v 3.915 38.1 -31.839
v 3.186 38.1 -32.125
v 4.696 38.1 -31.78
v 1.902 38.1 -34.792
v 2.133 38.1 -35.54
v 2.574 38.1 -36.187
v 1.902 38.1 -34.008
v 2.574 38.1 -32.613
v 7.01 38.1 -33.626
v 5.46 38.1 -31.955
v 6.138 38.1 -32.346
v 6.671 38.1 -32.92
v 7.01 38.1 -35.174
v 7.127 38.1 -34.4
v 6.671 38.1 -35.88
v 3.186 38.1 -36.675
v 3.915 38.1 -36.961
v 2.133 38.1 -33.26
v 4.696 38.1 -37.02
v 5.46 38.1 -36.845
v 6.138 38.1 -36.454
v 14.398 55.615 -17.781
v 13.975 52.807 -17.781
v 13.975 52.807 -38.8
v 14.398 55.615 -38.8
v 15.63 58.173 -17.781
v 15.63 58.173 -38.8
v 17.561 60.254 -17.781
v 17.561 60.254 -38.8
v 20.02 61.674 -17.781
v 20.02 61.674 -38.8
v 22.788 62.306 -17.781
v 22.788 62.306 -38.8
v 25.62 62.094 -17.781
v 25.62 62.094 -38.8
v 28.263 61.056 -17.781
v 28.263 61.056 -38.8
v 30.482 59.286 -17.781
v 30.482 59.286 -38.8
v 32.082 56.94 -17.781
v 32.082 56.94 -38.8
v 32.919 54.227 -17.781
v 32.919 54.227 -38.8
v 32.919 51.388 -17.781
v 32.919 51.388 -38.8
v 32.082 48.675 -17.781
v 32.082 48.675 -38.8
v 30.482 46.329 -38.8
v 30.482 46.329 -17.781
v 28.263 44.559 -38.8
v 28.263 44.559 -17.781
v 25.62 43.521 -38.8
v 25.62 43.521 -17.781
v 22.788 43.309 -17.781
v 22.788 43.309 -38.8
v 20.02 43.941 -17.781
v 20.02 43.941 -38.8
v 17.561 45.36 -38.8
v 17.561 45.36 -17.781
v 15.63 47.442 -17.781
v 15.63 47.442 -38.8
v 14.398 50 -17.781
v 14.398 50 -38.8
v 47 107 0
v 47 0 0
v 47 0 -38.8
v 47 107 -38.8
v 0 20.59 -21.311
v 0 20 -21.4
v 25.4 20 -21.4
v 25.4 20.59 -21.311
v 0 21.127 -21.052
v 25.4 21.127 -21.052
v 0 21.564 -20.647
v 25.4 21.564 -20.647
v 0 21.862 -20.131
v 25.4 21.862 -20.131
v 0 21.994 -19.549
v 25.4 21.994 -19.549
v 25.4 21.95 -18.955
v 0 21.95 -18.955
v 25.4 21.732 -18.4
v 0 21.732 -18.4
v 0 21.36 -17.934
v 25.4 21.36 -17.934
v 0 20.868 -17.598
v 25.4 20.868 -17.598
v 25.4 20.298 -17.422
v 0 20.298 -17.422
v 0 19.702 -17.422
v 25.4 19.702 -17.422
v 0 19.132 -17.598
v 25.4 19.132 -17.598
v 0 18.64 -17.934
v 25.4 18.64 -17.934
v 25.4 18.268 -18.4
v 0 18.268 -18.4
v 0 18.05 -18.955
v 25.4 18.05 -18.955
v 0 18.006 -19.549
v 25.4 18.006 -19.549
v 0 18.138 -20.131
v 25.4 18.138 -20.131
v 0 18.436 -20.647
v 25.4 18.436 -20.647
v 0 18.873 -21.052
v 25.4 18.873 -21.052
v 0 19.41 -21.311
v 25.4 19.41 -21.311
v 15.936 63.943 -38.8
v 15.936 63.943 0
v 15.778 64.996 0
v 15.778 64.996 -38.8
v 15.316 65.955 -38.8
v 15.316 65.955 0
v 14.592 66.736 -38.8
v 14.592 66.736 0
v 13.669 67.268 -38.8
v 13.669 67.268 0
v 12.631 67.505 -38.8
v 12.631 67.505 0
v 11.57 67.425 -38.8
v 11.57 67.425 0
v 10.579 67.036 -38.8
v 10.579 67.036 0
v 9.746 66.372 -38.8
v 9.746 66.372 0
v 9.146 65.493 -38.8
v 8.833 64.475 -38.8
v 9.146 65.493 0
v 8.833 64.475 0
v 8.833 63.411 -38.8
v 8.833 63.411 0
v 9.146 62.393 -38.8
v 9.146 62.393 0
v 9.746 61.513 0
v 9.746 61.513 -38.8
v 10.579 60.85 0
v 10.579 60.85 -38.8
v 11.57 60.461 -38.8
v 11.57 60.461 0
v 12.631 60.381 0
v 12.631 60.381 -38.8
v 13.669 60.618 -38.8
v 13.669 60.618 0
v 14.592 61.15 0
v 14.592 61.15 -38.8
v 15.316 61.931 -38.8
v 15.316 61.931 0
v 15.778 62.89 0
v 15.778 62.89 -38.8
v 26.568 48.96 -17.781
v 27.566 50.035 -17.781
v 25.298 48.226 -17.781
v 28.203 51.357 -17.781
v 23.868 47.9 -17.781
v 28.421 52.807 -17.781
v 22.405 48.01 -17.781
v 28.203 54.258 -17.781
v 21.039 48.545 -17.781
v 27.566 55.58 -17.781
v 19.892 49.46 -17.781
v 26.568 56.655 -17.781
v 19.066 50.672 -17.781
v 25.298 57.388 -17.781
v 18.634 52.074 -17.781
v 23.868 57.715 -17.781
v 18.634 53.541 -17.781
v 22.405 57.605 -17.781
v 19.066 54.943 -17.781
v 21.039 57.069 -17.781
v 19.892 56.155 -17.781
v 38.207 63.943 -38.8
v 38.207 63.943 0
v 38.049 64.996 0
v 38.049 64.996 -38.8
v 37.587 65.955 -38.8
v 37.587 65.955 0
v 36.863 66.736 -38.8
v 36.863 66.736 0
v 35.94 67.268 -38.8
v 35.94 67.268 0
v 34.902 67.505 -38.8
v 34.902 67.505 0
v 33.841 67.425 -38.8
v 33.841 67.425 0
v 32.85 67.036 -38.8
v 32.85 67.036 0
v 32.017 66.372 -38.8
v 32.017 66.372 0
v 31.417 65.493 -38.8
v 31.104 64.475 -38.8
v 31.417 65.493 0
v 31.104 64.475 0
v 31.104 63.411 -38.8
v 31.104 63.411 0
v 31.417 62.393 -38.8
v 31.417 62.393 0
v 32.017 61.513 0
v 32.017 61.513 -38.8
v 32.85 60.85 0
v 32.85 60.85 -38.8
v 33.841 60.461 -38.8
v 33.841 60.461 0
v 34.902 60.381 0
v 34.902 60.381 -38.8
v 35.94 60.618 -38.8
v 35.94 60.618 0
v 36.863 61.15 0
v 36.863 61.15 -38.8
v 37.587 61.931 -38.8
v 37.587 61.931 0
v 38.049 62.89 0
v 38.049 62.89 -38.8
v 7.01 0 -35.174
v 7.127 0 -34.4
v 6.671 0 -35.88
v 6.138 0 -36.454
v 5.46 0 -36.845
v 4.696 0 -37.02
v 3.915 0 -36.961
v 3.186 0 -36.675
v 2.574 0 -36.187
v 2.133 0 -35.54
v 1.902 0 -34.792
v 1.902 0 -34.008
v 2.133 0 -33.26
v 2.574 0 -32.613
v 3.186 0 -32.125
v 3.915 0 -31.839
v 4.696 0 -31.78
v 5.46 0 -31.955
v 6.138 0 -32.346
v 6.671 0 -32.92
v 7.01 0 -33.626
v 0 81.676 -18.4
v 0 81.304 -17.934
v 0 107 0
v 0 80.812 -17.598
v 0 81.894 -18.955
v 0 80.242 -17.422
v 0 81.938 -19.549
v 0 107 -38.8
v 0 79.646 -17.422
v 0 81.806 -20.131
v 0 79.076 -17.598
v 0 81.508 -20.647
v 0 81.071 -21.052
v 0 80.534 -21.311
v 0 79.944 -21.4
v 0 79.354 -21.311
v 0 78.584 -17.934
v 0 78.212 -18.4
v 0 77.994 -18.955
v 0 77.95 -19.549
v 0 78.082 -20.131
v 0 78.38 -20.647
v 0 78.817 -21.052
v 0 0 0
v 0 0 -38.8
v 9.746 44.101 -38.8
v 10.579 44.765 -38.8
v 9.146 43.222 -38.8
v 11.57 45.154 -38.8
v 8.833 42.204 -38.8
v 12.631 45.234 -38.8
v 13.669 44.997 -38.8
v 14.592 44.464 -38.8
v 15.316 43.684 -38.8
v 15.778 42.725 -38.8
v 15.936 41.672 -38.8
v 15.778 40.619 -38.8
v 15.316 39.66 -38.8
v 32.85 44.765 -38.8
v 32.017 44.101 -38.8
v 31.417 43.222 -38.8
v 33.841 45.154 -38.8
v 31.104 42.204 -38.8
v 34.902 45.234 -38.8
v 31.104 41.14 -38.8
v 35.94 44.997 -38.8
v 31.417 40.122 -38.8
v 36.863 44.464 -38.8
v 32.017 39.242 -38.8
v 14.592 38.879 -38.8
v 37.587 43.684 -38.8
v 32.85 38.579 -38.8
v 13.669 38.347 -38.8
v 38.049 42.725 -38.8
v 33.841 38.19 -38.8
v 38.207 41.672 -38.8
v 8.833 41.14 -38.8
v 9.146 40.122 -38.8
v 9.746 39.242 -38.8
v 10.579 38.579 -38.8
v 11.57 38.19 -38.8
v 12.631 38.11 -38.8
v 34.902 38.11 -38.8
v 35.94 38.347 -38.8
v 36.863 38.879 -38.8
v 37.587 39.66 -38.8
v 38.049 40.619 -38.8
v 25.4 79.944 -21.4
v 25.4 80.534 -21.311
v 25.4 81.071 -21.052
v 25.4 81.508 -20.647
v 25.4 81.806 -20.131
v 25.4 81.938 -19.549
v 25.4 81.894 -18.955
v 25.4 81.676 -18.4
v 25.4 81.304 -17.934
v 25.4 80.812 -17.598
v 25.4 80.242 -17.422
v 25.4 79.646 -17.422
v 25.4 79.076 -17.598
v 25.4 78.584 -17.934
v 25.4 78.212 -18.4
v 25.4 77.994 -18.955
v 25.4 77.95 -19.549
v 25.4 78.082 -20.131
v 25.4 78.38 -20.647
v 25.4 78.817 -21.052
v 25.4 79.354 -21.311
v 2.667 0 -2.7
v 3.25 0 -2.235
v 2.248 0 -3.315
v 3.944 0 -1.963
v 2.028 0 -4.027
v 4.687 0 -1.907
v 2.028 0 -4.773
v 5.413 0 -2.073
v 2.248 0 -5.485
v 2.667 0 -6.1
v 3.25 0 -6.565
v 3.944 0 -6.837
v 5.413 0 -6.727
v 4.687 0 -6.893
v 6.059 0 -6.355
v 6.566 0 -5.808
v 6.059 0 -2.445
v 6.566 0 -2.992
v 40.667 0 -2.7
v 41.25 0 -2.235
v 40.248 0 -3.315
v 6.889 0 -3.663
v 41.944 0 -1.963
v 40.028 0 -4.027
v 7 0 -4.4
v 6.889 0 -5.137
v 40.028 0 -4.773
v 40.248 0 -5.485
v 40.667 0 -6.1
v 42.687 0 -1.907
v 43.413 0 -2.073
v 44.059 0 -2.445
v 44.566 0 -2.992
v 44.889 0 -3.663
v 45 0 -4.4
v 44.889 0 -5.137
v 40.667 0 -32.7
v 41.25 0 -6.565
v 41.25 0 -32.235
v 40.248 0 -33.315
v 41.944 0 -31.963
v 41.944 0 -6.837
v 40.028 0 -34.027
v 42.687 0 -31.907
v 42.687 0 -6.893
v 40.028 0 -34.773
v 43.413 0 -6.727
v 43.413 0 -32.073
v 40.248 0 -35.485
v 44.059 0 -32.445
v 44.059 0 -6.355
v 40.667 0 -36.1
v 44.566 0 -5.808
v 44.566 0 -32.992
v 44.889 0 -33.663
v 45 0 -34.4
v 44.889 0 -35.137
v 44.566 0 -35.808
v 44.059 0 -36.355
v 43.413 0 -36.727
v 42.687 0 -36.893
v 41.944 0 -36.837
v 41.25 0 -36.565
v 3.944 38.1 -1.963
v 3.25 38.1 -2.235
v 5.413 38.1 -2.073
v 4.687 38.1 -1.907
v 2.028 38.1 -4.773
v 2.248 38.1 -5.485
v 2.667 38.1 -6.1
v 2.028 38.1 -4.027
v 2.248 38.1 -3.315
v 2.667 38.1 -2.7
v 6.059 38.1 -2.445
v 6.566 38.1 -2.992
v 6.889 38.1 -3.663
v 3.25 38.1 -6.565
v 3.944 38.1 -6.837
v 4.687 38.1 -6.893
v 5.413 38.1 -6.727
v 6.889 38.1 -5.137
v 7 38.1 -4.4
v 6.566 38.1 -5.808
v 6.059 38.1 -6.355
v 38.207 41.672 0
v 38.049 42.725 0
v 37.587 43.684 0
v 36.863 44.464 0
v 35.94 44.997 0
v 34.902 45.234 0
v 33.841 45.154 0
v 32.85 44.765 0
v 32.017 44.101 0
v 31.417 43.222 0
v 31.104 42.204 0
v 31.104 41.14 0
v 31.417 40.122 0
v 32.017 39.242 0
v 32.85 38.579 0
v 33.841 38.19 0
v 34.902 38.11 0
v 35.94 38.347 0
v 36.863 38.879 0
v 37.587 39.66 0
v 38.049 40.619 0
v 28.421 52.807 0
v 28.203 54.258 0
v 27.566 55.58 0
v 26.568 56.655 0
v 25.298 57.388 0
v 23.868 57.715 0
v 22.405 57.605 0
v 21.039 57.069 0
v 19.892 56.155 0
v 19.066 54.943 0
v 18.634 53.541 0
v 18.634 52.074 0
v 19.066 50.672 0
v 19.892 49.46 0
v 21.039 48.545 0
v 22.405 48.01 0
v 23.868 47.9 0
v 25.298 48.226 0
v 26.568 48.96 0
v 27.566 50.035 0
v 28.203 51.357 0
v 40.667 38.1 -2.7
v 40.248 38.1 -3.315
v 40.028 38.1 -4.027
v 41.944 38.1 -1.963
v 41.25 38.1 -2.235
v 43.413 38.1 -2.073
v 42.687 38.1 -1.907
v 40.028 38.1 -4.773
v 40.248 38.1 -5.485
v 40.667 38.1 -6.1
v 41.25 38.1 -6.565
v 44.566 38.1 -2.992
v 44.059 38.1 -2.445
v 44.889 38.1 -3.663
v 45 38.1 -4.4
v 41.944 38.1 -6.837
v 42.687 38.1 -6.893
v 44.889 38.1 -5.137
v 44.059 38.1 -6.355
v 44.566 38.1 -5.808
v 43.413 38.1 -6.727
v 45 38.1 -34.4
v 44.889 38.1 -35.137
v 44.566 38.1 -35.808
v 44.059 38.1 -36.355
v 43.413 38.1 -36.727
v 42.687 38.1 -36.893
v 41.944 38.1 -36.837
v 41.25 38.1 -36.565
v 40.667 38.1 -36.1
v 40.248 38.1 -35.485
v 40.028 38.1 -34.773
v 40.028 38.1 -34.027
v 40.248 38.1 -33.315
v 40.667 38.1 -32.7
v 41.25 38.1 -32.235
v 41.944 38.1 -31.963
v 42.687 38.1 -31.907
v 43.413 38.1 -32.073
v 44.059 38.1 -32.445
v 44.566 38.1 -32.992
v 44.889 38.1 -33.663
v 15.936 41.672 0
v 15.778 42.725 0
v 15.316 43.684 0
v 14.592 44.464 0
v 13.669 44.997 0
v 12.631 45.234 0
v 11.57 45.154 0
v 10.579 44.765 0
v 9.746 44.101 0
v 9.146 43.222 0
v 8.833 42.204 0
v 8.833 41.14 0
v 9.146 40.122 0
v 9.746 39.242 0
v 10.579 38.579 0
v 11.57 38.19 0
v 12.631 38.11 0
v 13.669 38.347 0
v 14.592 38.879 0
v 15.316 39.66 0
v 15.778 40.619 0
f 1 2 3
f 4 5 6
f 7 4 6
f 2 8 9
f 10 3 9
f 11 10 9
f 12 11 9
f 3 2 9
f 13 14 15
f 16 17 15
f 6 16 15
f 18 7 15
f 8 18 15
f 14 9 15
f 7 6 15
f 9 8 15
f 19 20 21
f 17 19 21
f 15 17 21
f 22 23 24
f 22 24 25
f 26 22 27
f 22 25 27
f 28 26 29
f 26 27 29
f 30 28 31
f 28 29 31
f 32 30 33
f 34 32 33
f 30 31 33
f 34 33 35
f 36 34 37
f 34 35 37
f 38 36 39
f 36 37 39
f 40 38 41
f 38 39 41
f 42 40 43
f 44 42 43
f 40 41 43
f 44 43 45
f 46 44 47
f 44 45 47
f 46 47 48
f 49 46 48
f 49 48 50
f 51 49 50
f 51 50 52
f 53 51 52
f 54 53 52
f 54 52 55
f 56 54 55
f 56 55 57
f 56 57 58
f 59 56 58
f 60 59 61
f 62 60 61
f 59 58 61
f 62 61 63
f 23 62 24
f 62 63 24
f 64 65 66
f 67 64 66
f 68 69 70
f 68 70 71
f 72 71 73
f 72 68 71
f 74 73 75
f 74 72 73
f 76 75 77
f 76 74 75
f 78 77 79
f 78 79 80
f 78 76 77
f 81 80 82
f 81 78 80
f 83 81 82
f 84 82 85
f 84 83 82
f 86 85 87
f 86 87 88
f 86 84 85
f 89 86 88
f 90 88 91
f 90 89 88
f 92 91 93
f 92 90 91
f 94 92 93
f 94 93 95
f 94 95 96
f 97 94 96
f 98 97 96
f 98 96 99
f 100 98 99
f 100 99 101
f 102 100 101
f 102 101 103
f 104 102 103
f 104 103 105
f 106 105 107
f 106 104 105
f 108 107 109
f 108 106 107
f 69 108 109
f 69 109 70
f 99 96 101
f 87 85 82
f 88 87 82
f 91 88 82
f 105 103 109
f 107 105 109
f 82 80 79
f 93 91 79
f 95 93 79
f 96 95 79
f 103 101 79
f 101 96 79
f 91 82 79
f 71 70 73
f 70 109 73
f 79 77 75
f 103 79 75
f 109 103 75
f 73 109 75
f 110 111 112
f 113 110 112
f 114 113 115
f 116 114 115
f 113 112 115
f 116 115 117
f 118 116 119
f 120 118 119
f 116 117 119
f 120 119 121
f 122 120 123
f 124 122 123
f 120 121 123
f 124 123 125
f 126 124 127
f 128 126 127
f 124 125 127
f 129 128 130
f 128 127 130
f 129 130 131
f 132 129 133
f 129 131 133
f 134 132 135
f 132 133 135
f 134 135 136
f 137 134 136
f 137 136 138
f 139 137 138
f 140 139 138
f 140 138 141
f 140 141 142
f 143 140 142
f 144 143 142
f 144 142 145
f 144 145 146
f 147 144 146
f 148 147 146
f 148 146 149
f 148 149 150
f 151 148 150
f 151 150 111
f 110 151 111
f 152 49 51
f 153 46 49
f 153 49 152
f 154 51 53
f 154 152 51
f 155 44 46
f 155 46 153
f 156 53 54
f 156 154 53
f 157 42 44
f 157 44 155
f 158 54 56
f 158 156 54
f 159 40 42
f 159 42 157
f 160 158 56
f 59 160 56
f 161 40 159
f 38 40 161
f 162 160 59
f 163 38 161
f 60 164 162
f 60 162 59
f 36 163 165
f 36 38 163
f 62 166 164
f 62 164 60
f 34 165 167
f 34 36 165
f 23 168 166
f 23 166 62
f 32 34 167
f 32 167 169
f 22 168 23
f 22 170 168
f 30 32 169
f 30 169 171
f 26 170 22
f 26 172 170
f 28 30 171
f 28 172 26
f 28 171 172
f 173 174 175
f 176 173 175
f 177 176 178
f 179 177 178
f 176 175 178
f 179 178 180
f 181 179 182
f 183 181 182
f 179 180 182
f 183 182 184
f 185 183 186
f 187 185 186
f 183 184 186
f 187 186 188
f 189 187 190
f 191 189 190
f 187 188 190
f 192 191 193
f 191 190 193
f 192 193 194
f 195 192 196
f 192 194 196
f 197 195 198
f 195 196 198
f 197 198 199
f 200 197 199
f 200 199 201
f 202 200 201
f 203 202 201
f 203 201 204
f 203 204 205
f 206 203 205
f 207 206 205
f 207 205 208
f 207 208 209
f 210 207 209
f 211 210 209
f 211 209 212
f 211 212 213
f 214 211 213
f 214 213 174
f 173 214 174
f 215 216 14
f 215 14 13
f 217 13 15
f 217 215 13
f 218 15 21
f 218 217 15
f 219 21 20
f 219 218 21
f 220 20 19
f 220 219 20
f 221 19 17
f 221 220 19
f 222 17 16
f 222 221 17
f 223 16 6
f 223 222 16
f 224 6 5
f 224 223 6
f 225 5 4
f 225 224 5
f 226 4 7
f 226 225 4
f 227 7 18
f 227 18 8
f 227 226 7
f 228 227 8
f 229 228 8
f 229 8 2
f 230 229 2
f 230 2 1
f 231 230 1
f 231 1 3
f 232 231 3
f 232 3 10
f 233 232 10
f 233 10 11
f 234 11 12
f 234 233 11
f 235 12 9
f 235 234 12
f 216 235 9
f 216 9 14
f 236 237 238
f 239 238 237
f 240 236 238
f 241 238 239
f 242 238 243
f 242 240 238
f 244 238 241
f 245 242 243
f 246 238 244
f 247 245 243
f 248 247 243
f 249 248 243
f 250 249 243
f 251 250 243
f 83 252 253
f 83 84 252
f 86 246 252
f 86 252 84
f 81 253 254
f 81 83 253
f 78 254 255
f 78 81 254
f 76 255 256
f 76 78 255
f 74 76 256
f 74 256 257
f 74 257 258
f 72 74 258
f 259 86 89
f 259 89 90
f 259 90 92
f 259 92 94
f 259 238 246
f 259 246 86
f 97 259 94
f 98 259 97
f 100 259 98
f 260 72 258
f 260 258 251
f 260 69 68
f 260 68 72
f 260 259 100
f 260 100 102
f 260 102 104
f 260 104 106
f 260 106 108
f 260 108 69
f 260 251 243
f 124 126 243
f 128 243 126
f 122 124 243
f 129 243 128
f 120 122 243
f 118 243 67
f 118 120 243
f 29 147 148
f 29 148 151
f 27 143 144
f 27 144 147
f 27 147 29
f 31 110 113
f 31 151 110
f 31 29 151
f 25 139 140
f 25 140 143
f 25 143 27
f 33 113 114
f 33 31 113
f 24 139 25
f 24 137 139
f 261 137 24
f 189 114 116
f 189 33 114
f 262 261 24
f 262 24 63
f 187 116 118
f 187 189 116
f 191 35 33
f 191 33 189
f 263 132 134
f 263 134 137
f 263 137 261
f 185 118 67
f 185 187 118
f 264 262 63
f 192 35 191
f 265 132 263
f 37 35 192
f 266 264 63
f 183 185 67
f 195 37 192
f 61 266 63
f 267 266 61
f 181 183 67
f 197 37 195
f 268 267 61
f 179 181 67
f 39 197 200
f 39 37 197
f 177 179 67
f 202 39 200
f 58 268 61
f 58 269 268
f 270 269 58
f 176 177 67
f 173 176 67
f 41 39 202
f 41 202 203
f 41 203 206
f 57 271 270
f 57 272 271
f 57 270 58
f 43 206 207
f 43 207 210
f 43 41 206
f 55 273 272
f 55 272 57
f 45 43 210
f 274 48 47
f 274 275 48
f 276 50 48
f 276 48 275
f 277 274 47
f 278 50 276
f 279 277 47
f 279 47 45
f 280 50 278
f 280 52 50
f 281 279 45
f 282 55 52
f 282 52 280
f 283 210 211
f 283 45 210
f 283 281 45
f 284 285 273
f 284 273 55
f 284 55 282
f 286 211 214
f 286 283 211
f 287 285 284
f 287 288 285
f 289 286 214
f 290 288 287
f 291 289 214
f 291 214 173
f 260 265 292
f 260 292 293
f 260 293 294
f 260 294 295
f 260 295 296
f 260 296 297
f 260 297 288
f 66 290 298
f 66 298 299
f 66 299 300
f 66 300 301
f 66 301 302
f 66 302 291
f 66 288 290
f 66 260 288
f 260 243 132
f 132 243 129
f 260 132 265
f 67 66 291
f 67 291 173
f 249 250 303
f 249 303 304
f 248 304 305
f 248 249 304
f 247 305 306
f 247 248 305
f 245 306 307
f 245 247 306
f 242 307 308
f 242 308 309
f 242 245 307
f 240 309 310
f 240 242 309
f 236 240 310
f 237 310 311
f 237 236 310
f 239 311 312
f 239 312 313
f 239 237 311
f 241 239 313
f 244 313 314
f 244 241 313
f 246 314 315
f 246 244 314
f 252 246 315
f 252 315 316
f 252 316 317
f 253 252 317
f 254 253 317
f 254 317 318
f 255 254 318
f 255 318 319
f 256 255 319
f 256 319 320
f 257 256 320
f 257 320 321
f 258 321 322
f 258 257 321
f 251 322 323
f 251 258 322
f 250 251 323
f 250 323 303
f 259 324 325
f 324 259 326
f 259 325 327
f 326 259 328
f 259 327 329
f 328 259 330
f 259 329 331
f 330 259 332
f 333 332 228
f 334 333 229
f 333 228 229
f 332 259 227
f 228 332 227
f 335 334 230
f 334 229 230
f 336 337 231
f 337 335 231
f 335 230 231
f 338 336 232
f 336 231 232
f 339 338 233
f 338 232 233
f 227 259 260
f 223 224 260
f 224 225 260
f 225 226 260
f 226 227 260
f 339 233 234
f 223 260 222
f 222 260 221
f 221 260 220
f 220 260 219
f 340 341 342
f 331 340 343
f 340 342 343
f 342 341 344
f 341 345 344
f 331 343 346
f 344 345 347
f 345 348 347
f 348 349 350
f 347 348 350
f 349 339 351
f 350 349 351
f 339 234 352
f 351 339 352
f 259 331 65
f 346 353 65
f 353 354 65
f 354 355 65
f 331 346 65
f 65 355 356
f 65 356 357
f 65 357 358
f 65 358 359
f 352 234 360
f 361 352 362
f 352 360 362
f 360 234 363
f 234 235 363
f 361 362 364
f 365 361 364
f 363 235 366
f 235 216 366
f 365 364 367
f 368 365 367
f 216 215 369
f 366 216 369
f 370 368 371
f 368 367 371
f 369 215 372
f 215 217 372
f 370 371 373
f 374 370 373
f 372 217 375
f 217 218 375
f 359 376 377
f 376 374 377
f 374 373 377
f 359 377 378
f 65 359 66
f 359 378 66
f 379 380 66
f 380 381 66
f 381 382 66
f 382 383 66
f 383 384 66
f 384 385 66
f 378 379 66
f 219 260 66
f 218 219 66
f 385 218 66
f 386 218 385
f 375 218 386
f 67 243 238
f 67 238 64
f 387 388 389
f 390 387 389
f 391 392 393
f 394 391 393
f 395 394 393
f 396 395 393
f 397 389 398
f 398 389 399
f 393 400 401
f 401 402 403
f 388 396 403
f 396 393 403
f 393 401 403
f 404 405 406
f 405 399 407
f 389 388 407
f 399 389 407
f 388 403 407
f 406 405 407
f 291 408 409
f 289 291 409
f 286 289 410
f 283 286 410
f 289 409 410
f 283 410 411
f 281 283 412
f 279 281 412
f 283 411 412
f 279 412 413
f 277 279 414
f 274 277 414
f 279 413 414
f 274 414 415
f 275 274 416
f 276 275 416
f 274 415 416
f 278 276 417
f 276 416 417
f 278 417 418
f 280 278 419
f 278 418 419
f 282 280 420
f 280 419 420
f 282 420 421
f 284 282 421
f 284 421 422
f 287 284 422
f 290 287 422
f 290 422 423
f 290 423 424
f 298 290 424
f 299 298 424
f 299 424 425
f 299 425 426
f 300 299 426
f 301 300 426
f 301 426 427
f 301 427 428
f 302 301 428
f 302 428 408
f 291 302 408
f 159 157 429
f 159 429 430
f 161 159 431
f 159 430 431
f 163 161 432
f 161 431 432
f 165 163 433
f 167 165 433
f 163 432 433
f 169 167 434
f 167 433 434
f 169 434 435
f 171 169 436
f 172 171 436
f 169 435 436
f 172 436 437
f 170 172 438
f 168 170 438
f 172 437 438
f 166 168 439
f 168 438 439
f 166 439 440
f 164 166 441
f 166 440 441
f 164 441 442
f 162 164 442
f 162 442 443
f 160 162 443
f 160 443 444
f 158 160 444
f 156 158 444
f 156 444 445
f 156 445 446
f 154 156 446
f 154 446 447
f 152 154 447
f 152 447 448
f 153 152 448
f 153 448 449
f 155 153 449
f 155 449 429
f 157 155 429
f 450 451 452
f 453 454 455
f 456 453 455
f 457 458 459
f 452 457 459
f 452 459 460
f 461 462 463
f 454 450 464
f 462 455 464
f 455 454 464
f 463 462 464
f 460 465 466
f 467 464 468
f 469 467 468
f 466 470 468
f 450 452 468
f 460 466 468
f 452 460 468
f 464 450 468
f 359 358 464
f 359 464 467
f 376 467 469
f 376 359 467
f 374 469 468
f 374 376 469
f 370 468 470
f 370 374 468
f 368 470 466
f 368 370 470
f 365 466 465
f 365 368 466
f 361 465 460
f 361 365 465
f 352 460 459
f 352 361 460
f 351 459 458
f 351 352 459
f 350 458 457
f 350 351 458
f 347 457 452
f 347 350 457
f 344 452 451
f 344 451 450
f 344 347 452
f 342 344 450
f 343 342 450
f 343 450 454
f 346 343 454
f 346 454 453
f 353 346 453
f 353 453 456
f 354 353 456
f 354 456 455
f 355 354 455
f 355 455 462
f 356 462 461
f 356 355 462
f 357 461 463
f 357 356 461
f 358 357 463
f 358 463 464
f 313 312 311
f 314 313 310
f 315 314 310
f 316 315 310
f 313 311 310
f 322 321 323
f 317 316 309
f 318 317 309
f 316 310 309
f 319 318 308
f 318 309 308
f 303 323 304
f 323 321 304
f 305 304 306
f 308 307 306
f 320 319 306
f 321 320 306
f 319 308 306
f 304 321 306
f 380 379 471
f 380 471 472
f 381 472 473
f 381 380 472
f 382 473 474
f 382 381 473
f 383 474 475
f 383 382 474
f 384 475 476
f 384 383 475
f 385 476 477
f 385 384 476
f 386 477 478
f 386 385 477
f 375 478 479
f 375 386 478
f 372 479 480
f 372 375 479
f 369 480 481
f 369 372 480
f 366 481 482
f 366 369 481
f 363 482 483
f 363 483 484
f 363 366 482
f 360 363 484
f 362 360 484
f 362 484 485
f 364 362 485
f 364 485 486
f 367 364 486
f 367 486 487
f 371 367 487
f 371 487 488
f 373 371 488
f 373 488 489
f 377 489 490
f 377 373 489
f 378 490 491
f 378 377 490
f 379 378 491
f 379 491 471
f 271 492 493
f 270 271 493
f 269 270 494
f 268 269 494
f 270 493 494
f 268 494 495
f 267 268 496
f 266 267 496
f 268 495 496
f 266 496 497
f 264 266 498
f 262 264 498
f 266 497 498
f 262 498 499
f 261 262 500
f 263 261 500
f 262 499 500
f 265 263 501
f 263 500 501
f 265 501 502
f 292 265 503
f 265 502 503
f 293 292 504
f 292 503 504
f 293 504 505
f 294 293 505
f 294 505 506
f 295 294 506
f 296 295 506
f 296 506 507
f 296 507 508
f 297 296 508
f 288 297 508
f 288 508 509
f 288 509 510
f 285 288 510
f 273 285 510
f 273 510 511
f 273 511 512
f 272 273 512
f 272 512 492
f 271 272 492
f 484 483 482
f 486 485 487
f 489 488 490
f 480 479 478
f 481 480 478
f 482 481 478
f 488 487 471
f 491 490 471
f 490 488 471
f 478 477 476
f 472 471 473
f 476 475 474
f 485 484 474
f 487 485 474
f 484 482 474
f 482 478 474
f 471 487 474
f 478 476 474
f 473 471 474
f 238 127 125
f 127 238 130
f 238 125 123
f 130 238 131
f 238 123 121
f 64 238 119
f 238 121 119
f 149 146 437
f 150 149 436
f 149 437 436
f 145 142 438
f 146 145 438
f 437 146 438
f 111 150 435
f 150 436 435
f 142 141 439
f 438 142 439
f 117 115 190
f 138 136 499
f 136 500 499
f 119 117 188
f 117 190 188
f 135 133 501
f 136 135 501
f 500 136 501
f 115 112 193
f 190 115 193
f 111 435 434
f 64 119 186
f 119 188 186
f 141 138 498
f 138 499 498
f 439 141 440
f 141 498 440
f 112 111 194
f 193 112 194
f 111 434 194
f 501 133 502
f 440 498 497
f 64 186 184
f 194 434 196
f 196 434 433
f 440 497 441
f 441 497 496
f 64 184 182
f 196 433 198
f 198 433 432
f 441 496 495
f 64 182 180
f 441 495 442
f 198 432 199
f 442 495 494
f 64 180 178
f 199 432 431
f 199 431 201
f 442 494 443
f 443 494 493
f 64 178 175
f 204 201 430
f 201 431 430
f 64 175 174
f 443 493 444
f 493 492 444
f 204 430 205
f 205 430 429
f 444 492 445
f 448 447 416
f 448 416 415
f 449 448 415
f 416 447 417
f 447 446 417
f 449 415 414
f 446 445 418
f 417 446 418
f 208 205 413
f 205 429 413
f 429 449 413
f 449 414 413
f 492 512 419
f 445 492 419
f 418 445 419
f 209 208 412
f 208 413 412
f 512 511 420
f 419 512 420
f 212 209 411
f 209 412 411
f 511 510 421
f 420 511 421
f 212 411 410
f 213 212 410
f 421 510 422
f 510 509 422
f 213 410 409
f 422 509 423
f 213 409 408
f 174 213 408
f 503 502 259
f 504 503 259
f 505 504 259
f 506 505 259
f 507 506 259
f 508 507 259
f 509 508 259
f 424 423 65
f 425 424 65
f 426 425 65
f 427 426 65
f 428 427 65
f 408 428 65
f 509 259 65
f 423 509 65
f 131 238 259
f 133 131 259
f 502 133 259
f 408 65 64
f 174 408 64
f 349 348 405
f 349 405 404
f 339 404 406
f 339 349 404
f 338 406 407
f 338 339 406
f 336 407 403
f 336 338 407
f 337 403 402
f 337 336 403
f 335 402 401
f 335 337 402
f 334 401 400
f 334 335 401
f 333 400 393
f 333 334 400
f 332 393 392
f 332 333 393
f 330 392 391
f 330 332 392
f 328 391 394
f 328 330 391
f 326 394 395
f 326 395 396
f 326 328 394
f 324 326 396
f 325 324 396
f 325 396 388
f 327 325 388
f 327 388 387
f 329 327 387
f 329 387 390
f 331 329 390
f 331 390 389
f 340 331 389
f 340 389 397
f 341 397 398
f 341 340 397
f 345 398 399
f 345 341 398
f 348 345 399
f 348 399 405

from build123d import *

# Parameters (mm, degrees)
SKETCH1_W           = 47
SKETCH1_H           = 38.8
SKETCH1_R           = 2.5
SKETCH1_R_2         = 2.627
BOSS_EXTRUDE1_DEPTH = 106.999989
SKETCH2_R           = 3.571875
SKETCH2_R_2         = 4.92125
CUT_EXTRUDE1_DEPTH  = 39.8
SKETCH1_8_R         = 2.627
SKETCH1_8_R_2       = 2.5
CUT_EXTRUDE2_DEPTH  = 38.1
CUT_EXTRUDE3_START  = -47
SKETCH3_R           = 2
CUT_EXTRUDE3_DEPTH  = 25.4
SKETCH4_R           = 9.525
CUT_EXTRUDE4_DEPTH  = 21.0185


with BuildPart() as part:
    # Sketch1 → Boss-Extrude1 (new body)
    with BuildSketch(Plane(origin=(0, 0, 0), x_dir=(1, 0, 0), z_dir=(0, 1, 0))):
        with Locations((23.5, 19.4)):
            Rectangle(SKETCH1_W, SKETCH1_H)
        with Locations((4.5, 4.4)):
            Circle(SKETCH1_R, mode=Mode.SUBTRACT)
        with Locations((42.5, 4.4)):
            Circle(SKETCH1_R, mode=Mode.SUBTRACT)
        with Locations((4.5, 34.4)):
            Circle(SKETCH1_R_2, mode=Mode.SUBTRACT)
        with Locations((42.5, 34.4)):
            Circle(SKETCH1_R, mode=Mode.SUBTRACT)
        with Locations((42.5, 4.4)):
            Circle(SKETCH1_R)
        with Locations((4.5, 4.4)):
            Circle(SKETCH1_R)
        with Locations((4.5, 34.4)):
            Circle(SKETCH1_R_2)
        with Locations((42.5, 34.4)):
            Circle(SKETCH1_R)
    extrude(amount=BOSS_EXTRUDE1_DEPTH)

    # Sketch2 → Cut-Extrude1 (cut, through all)
    with BuildSketch(Plane.XY):
        with Locations((12.36448241, 63.94291018)):
            Circle(SKETCH2_R)
        with Locations((34.63551759, 63.94291018)):
            Circle(SKETCH2_R)
        with Locations((34.63551759, 41.671875)):
            Circle(SKETCH2_R)
        with Locations((23.5, 52.80739259)):
            Circle(SKETCH2_R_2)
        with Locations((12.36448241, 41.671875)):
            Circle(SKETCH2_R)
    extrude(amount=-CUT_EXTRUDE1_DEPTH, mode=Mode.SUBTRACT)

    # Sketch1<8> → Cut-Extrude2 (cut)
    with BuildSketch(Plane(origin=(0, 0, 0), x_dir=(1, 0, 0), z_dir=(0, 1, 0))):
        with Locations((4.5, 34.4)):
            Circle(SKETCH1_8_R)
        with Locations((4.5, 4.4)):
            Circle(SKETCH1_8_R_2)
        with Locations((42.5, 4.4)):
            Circle(SKETCH1_8_R_2)
        with Locations((42.5, 34.4)):
            Circle(SKETCH1_8_R_2)
    extrude(amount=CUT_EXTRUDE2_DEPTH, mode=Mode.SUBTRACT)

    # Sketch3 → Cut-Extrude3 (cut)
    with BuildSketch(Plane(origin=(47, 0, 0), x_dir=(0, 0, -1), z_dir=(1, 0, 0)).offset(CUT_EXTRUDE3_START)):
        with Locations((19.4, 20)):
            Circle(SKETCH3_R)
        with Locations((19.4, 79.944)):
            Circle(SKETCH3_R)
    extrude(amount=CUT_EXTRUDE3_DEPTH, mode=Mode.SUBTRACT)

    # Sketch4 → Cut-Extrude4 (cut)
    with BuildSketch(Plane(origin=(0, 0, -38.8), x_dir=(-1, 0, 0), z_dir=(0, 0, -1))):
        with Locations((-23.5, 52.80739259)):
            Circle(SKETCH4_R)
    extrude(amount=-CUT_EXTRUDE4_DEPTH, mode=Mode.SUBTRACT)


solid = part.part
